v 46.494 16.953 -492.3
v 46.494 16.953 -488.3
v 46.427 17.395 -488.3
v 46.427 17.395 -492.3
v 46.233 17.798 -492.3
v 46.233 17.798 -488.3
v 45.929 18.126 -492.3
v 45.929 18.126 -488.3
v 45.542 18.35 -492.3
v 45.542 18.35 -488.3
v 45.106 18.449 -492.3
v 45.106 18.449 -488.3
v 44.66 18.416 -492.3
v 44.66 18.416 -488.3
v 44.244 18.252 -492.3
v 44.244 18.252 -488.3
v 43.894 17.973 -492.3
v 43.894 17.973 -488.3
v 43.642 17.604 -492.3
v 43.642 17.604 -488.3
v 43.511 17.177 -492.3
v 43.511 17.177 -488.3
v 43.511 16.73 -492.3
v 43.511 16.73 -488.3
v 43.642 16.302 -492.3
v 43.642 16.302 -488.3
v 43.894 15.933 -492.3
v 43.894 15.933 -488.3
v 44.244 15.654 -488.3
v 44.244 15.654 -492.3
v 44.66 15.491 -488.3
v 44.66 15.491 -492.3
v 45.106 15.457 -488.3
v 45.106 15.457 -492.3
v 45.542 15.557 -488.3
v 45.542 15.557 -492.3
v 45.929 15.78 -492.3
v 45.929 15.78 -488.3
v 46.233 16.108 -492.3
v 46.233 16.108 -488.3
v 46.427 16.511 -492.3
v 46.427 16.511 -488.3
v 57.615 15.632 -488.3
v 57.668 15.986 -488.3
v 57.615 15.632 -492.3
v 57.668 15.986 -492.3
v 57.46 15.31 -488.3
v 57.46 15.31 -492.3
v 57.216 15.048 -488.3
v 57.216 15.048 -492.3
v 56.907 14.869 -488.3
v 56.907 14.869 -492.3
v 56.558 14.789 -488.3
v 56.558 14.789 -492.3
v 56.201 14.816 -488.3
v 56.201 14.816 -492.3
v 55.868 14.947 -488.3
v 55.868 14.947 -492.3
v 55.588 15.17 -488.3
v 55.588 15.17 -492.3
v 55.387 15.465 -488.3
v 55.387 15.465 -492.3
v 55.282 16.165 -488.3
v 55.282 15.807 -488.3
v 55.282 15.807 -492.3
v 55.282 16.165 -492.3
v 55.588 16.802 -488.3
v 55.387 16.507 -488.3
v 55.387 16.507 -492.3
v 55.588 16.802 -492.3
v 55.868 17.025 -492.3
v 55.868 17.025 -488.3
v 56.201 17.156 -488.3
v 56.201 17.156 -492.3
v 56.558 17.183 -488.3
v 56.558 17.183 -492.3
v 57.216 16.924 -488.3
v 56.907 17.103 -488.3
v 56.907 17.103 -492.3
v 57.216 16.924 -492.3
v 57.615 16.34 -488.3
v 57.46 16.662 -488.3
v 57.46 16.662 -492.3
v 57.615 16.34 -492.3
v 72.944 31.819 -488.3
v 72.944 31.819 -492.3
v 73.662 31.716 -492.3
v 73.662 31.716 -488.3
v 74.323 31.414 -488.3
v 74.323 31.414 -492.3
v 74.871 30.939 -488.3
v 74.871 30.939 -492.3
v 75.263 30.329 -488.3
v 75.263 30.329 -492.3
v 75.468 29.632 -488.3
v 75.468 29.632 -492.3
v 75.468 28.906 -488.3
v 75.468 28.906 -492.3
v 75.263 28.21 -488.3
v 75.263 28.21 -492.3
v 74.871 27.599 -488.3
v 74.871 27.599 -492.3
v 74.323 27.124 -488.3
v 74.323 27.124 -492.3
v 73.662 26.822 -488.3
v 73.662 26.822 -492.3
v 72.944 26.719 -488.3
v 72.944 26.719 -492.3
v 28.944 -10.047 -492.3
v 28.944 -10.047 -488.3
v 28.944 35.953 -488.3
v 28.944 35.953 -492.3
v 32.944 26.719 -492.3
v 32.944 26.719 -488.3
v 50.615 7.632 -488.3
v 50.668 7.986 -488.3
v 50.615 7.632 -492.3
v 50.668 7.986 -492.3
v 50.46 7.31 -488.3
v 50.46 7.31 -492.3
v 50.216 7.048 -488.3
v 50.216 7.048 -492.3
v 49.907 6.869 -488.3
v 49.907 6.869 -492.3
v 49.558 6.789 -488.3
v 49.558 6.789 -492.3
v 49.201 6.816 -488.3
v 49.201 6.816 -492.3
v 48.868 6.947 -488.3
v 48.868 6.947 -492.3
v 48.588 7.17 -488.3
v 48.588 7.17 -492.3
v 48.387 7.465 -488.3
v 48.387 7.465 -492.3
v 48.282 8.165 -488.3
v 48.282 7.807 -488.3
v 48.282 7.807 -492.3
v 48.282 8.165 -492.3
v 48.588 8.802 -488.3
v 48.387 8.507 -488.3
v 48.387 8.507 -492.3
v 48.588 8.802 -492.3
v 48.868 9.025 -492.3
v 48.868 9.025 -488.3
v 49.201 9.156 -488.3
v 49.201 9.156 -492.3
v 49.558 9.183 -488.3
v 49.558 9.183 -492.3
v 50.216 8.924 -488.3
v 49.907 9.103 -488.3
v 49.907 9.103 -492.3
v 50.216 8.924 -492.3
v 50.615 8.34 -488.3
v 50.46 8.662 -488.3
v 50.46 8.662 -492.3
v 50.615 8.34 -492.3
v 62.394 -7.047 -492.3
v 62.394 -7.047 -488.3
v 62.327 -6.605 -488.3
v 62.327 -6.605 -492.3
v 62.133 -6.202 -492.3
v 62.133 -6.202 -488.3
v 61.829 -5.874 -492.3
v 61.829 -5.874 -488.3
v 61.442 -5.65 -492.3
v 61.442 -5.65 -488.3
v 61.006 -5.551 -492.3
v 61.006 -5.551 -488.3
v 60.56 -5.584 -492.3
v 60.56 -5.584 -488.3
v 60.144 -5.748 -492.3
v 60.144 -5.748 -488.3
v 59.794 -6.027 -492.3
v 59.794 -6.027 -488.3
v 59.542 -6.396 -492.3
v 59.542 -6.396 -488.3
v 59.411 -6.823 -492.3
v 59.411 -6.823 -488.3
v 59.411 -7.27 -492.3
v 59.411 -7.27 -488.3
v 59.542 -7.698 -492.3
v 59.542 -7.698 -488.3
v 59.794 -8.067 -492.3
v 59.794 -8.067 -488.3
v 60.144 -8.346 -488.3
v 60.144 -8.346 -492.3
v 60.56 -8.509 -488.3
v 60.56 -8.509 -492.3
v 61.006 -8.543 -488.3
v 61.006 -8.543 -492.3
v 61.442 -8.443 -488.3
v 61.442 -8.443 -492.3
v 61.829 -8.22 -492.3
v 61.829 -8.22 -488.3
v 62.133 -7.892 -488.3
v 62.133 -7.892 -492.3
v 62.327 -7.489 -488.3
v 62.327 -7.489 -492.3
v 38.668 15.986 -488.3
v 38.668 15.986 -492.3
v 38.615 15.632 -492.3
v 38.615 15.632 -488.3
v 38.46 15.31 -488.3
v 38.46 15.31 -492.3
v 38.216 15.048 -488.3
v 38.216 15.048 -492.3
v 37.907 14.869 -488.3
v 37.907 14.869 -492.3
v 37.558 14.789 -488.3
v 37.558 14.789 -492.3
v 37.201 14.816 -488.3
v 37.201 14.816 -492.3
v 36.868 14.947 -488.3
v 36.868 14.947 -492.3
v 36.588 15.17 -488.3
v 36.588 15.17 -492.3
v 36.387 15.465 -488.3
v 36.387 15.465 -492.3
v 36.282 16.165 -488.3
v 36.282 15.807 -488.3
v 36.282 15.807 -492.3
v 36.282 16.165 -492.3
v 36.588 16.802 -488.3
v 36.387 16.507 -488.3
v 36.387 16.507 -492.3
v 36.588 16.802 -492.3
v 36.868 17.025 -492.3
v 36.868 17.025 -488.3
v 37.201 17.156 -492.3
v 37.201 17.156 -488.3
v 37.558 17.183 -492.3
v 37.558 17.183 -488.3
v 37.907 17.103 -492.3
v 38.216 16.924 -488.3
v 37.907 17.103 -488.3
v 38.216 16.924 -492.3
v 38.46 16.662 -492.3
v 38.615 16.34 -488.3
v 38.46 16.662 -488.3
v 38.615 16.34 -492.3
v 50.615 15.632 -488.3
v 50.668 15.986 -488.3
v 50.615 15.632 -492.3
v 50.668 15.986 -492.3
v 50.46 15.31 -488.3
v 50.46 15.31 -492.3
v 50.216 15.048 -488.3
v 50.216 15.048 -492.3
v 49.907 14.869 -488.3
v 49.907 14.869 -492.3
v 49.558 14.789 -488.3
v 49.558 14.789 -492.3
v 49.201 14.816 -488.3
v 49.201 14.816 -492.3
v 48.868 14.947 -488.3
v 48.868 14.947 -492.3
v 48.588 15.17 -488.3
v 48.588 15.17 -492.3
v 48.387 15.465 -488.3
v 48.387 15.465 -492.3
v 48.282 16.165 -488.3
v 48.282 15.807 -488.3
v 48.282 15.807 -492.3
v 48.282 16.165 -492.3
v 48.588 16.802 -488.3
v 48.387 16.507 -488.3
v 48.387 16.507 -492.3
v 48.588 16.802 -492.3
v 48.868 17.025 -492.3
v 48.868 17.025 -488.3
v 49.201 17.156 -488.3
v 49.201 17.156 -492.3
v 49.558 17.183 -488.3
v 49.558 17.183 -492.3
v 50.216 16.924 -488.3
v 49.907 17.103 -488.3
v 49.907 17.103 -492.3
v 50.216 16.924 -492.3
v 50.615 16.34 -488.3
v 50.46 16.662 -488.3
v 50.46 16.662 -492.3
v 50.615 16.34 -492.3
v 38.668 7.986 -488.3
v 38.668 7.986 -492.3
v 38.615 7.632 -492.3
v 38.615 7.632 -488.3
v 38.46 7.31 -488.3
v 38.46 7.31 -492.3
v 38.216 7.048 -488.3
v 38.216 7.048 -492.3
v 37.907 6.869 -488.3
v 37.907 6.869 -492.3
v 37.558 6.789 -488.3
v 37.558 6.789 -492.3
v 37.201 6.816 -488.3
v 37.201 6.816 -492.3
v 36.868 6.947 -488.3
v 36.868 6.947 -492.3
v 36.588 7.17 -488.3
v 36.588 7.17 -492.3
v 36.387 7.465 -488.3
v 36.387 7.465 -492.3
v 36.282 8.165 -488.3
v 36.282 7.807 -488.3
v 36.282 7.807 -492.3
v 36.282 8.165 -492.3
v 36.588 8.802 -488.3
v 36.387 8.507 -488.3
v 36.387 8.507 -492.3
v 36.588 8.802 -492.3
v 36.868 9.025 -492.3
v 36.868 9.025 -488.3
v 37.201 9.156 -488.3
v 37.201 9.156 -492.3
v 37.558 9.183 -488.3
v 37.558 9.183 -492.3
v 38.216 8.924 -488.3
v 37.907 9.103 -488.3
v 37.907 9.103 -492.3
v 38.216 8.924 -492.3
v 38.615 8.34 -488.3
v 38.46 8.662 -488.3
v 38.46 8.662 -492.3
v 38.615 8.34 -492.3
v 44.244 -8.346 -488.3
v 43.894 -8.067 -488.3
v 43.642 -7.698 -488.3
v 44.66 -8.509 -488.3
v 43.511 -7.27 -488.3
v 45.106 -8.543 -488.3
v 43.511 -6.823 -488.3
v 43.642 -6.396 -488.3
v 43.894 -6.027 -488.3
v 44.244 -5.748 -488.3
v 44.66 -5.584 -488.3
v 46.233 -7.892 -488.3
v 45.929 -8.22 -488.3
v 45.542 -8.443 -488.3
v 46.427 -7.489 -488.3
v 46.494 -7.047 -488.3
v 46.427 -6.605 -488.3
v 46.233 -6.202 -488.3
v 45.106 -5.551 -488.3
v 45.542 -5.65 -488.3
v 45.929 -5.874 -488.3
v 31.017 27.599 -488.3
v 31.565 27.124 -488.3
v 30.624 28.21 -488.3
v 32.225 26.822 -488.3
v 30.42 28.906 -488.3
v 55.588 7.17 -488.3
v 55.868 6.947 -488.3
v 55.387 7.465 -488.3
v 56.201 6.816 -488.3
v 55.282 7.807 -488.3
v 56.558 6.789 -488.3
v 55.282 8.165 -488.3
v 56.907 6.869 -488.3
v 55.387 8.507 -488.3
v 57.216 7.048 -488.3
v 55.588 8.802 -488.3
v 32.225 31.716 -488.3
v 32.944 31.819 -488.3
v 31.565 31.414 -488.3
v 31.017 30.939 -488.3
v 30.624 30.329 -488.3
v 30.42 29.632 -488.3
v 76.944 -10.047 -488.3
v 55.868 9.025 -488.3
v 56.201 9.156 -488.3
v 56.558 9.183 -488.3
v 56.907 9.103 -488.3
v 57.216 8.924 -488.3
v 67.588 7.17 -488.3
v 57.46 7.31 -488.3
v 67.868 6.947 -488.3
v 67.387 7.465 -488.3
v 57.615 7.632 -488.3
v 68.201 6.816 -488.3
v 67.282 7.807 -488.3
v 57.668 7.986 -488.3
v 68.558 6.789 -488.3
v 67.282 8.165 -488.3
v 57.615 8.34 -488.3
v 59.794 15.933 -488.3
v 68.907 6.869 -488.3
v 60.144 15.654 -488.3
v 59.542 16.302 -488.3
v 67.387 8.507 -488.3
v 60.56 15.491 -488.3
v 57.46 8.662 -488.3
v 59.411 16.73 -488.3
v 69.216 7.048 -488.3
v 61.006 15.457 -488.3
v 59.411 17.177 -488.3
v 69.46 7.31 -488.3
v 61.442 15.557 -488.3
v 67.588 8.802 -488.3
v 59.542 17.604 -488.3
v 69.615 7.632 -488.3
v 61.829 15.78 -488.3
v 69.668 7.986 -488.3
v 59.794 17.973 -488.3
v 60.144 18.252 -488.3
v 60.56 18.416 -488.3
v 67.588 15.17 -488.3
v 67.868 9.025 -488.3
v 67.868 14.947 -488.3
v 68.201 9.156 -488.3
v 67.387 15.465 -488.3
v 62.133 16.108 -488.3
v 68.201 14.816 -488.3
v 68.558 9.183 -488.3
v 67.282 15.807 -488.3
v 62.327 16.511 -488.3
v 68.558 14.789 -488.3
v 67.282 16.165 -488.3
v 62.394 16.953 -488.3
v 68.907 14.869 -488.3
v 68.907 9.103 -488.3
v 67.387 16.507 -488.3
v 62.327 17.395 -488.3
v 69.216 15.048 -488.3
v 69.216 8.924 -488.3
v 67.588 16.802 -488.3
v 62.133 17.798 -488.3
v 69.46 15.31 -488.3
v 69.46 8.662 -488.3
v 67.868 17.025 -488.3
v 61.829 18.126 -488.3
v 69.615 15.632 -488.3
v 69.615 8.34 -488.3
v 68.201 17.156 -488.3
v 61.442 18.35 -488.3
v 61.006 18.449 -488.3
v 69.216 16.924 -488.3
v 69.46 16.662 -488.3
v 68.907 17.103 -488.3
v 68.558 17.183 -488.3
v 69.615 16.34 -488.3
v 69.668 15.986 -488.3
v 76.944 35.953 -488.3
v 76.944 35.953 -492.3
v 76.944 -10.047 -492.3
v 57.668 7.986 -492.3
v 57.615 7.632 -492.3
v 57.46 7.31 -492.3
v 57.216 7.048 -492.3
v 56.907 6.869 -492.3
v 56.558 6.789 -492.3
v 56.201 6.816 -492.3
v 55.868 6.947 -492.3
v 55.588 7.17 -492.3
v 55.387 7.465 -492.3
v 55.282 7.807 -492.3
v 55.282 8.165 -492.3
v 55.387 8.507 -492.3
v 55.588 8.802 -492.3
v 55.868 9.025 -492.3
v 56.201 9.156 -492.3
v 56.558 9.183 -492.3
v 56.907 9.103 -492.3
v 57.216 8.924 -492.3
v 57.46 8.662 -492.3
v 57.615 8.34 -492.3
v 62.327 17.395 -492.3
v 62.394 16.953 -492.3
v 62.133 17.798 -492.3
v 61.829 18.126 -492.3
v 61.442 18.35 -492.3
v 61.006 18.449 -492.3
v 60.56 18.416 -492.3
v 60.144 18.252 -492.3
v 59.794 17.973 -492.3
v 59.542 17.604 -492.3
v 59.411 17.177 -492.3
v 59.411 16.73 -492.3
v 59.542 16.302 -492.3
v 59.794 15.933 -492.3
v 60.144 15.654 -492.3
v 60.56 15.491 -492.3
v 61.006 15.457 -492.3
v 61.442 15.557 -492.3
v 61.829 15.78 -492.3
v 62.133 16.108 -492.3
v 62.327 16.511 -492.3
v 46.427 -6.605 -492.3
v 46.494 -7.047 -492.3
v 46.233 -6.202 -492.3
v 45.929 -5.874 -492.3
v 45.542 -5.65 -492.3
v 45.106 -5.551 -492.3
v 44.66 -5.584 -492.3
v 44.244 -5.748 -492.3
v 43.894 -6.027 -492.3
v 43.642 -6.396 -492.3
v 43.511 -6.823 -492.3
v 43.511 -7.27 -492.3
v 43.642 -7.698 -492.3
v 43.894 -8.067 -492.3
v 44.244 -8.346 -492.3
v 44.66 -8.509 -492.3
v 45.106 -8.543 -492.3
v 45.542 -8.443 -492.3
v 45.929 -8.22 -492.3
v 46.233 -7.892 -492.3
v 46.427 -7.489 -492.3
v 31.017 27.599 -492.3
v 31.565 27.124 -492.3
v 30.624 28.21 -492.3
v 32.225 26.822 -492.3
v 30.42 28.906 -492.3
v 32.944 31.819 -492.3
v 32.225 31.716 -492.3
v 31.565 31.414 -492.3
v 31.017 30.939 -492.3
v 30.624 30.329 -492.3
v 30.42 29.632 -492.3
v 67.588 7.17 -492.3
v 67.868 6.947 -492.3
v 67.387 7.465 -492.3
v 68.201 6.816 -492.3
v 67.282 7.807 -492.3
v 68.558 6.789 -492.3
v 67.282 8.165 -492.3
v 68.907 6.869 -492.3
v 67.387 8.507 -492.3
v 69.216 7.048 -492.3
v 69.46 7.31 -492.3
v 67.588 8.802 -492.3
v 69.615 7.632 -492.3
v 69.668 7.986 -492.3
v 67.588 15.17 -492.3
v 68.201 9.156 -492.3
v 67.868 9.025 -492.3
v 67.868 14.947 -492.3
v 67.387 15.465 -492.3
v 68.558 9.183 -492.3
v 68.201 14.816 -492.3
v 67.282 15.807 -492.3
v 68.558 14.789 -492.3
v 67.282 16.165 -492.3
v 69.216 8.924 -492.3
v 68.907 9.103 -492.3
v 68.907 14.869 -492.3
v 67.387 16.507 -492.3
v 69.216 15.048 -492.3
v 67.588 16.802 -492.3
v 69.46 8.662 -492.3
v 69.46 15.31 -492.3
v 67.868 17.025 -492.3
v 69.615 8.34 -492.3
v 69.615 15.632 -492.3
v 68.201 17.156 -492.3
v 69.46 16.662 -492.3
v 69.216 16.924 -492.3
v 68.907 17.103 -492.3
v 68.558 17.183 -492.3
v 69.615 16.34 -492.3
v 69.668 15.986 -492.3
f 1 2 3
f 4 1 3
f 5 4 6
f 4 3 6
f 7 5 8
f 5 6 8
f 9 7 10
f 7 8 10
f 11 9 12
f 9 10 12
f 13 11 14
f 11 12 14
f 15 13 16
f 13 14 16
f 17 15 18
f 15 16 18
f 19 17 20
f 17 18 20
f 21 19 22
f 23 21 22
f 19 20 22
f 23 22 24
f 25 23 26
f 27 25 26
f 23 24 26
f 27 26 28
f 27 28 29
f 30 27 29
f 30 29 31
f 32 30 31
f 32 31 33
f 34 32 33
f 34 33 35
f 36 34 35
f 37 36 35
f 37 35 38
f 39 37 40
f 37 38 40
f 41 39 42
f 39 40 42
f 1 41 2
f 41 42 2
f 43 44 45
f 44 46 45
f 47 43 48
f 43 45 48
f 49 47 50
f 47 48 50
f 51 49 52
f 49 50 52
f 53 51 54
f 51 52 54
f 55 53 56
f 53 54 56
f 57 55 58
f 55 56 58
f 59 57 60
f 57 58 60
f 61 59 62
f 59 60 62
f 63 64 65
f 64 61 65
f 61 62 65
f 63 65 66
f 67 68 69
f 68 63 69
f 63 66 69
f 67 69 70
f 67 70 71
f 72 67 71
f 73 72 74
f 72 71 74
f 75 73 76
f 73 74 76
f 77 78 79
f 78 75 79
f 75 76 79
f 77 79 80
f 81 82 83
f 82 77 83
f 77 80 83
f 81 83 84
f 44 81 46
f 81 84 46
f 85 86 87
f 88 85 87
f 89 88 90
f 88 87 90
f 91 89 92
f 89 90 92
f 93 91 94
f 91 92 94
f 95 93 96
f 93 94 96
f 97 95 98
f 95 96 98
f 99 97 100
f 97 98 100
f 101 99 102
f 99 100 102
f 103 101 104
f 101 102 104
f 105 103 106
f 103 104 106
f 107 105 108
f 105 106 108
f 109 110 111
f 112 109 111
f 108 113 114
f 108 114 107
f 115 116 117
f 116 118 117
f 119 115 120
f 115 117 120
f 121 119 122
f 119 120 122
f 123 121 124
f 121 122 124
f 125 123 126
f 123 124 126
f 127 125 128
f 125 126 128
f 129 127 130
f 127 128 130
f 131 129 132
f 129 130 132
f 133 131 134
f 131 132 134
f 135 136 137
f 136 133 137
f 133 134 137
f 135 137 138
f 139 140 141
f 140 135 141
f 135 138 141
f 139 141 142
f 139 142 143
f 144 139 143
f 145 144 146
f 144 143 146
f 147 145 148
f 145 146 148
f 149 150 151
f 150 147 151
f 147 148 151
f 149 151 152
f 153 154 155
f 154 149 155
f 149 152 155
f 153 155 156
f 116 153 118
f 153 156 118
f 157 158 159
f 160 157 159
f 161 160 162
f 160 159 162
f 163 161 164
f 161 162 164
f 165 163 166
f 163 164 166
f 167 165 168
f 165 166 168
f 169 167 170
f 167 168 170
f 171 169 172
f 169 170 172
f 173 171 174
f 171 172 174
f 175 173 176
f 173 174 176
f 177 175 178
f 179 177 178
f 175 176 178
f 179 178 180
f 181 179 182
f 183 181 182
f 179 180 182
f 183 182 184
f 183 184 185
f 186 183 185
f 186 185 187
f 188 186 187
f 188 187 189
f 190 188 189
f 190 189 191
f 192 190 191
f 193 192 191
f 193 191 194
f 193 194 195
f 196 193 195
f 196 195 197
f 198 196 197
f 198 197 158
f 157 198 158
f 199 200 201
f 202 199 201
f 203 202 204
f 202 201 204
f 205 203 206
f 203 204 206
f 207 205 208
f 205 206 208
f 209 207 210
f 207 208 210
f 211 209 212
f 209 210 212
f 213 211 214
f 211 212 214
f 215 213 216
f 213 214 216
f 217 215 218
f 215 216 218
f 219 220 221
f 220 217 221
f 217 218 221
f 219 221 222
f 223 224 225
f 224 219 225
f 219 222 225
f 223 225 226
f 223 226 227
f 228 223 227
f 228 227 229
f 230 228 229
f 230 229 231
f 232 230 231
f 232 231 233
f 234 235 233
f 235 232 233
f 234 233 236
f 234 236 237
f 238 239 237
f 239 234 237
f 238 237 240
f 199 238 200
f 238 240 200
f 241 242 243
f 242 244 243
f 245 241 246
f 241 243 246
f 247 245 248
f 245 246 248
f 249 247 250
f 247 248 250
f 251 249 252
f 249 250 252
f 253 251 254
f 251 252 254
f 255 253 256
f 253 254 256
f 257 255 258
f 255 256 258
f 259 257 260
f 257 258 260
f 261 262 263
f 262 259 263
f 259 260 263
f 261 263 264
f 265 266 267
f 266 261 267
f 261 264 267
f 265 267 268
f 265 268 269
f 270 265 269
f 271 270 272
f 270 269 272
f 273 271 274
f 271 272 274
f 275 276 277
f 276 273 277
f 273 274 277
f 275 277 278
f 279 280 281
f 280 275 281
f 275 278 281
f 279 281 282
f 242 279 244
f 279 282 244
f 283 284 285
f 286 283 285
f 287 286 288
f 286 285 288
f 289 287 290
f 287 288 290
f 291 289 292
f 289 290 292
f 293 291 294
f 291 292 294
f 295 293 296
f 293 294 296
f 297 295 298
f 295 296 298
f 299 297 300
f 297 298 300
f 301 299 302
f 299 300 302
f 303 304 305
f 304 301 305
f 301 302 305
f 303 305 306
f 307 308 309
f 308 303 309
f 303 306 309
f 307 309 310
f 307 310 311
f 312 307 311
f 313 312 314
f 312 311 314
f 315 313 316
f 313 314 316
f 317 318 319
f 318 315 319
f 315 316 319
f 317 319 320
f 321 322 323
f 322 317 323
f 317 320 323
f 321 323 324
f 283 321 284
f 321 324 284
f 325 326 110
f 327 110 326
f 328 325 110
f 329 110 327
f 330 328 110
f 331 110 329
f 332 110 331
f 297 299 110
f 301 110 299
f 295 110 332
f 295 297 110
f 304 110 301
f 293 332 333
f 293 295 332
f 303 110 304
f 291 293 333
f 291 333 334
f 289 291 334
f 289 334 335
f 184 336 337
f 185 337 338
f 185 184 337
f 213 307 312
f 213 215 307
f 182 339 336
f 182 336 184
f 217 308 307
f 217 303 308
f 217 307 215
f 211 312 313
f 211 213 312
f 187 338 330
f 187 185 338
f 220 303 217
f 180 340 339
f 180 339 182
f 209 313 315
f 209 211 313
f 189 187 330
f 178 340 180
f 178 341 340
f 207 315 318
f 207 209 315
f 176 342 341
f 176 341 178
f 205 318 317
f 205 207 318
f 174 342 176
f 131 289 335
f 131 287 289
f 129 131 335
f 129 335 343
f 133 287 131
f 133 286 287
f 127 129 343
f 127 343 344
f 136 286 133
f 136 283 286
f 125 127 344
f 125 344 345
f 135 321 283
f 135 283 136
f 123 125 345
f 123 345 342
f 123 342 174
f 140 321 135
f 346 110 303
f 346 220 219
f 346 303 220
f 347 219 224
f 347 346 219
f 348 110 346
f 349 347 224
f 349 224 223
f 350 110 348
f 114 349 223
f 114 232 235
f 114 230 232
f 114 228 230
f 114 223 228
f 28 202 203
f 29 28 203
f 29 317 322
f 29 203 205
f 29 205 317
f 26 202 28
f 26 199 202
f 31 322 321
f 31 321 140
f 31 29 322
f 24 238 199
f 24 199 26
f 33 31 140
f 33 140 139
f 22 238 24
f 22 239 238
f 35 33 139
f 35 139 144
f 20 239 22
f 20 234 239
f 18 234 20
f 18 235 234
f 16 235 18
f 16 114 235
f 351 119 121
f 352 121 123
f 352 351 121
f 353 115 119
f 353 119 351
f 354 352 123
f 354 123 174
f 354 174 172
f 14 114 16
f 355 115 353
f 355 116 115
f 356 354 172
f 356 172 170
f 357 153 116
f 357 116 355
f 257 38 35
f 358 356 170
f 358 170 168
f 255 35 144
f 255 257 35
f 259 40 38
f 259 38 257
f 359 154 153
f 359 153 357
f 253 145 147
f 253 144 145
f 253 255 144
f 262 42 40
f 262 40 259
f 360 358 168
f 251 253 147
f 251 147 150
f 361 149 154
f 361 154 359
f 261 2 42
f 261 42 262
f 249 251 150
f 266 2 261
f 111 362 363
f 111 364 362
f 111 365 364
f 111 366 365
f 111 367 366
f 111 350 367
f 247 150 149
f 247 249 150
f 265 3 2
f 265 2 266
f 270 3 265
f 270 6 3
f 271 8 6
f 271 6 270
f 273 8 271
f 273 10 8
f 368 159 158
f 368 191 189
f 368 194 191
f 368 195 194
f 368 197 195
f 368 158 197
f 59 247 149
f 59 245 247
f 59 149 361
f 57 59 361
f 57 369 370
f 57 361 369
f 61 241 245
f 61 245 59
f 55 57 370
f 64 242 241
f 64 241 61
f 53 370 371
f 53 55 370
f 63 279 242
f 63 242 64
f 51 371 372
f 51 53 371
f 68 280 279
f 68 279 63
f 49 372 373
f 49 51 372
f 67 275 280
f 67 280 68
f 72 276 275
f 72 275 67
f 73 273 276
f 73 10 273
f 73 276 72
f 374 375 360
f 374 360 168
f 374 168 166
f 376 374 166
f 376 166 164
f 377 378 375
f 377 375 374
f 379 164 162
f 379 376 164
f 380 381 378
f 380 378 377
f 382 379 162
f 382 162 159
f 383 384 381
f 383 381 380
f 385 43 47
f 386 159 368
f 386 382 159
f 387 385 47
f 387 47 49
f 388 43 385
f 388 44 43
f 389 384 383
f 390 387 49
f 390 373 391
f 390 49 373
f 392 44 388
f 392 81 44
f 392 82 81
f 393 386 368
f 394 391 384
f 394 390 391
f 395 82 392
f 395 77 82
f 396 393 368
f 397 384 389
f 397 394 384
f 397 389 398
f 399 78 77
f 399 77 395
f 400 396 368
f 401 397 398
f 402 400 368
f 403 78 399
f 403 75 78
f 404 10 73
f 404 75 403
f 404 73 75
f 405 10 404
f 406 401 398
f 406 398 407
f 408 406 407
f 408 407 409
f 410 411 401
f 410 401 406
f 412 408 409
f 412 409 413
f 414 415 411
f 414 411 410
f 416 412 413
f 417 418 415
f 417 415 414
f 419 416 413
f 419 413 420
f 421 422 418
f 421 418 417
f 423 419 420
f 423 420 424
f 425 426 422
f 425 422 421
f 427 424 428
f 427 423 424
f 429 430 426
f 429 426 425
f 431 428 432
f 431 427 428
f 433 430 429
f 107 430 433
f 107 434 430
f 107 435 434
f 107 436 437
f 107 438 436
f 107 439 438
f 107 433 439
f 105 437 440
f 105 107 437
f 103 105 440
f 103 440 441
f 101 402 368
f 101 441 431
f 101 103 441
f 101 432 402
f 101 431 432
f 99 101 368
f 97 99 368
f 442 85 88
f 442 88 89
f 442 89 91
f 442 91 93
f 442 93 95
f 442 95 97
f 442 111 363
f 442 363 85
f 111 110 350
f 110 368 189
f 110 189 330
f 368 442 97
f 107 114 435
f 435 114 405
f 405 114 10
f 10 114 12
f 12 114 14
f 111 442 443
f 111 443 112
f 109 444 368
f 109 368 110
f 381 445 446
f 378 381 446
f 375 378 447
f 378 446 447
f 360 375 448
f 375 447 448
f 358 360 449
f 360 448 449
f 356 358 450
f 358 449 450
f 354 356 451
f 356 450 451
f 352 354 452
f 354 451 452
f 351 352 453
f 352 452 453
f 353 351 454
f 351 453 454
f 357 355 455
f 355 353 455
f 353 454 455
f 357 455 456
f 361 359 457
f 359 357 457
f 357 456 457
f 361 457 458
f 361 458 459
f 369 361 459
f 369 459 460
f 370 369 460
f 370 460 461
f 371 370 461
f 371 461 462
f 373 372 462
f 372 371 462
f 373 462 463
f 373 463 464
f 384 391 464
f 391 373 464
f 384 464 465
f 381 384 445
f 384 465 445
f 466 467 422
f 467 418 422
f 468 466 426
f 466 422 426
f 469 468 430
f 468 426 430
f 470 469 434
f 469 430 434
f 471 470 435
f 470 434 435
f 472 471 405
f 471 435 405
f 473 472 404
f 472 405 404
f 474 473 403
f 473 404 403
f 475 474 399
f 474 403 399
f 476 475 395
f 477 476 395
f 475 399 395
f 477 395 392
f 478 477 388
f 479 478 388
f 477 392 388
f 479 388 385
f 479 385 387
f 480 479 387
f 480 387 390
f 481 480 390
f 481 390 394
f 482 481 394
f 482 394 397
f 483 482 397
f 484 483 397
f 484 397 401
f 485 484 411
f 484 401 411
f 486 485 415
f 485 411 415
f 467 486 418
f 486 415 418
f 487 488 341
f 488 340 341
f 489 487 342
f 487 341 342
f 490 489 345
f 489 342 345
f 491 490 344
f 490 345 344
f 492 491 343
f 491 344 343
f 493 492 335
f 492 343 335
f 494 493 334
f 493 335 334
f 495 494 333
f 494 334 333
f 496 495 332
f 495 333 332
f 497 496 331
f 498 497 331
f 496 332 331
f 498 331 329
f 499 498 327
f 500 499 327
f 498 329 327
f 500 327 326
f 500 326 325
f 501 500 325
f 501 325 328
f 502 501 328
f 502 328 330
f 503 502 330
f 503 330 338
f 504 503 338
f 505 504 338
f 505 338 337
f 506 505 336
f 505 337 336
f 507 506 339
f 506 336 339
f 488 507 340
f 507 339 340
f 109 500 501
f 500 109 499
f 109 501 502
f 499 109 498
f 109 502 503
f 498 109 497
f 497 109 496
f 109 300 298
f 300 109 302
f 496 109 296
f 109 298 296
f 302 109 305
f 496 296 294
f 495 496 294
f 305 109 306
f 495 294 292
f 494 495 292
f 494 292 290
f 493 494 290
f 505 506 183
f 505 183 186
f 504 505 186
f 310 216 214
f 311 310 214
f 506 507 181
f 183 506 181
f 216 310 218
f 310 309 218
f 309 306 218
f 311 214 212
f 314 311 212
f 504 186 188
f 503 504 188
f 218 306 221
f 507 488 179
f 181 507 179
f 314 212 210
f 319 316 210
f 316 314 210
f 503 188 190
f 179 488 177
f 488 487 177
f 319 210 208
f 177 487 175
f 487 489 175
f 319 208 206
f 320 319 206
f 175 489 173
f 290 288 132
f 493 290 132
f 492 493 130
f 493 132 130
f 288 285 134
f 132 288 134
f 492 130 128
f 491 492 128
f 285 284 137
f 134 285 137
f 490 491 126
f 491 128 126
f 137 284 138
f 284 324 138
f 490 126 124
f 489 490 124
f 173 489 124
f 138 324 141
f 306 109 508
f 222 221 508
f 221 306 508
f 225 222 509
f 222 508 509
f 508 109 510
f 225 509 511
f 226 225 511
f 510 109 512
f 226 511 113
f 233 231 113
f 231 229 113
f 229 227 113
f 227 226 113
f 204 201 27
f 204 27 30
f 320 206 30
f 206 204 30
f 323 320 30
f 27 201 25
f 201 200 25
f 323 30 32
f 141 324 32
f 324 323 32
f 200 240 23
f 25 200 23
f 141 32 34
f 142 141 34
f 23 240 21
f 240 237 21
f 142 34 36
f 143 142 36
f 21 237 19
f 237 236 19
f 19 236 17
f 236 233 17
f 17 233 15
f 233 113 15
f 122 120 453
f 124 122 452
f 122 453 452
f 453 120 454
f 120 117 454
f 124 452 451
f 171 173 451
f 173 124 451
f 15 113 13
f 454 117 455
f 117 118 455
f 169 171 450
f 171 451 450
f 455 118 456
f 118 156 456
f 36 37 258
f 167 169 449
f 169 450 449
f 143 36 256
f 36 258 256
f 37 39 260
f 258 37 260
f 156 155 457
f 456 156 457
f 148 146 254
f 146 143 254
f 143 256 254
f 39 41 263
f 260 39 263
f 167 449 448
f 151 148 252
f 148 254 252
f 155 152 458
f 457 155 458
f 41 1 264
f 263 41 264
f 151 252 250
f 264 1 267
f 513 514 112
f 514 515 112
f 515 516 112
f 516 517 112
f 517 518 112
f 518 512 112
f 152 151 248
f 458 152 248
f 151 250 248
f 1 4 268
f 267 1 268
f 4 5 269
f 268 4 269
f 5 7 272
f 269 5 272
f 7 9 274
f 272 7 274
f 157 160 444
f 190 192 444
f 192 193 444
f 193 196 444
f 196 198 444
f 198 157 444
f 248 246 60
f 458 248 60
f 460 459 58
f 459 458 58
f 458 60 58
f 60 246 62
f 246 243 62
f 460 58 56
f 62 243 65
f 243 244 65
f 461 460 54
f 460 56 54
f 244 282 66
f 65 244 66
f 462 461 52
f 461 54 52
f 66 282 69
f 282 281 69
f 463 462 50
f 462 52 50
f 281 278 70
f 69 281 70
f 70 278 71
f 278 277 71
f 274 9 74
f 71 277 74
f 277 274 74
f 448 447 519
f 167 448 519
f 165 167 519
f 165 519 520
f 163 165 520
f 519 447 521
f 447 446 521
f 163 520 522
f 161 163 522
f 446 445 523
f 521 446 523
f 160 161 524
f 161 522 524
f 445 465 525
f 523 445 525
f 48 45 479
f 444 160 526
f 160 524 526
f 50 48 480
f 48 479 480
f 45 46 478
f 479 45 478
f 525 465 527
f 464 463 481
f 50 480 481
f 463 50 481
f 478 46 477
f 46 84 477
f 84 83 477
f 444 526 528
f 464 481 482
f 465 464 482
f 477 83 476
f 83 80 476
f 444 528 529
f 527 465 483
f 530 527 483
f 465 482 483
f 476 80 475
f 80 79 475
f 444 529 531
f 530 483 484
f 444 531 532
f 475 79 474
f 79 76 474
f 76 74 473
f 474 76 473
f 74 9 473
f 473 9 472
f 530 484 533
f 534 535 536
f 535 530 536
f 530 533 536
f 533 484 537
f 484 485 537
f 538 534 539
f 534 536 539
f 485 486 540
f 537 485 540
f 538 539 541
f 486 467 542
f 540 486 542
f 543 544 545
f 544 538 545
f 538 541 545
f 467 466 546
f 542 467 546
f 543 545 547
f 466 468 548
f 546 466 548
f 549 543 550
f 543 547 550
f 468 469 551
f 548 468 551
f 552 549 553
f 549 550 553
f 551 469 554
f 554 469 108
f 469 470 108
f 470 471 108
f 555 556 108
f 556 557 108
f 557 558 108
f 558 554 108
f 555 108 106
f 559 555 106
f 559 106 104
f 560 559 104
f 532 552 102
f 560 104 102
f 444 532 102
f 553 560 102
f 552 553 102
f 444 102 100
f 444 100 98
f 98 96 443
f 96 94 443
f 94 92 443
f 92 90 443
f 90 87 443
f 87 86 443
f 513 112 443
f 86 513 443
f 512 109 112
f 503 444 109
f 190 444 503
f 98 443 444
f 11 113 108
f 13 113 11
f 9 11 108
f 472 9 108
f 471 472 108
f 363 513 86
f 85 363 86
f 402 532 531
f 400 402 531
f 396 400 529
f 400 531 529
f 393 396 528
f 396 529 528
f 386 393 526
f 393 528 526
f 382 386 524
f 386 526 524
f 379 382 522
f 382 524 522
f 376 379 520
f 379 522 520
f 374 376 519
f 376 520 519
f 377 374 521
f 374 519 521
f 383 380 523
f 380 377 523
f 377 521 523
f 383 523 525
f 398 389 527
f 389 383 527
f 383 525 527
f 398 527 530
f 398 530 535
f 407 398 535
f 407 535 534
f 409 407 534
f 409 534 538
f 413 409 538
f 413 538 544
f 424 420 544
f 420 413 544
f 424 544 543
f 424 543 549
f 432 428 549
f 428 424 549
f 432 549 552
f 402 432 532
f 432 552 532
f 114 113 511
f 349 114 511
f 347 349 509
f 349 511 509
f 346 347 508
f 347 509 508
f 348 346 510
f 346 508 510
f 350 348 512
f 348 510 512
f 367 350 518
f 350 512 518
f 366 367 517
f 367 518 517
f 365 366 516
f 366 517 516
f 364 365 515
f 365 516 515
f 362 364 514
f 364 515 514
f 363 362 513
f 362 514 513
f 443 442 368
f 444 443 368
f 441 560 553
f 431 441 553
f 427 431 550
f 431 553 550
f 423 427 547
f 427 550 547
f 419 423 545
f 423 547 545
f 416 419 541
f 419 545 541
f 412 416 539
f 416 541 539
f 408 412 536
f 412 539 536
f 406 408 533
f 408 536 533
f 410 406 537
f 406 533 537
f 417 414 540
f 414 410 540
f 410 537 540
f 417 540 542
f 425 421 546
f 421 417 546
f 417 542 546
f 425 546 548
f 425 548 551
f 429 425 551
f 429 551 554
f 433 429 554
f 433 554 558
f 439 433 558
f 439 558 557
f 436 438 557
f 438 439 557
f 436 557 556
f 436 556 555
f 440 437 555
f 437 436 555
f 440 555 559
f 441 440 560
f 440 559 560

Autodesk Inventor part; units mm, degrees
ref_plane "YZ Plane" through (0, 0, 0) normal (1, 0, 0) x (0, 1, 0)
ref_plane "XZ Plane" through (0, 0, 0) normal (0, 1, 0) x (-1, 0, 0)
ref_plane "XY Plane" through (0, 0, 0) normal (0, 0, 1) x (1, 0, 0)
ref_plane "РабПлоскость1" through (30.6718, 18.7359, -492.3) normal (0, 0, 1) x (1, 0, 0)
sketch "Эскиз1" plane through (30.6718, 18.7359, -492.3) normal (0, 0, 1) x (1, 0, 0)
  line L0 (9.0963, 0) -> (4.4963, 0) projected
  line L1 (4.4963, 0) -> (4.4963, -13.5) projected
  line L2 (9.0963, -13.5) -> (4.4963, -13.5) projected
  line L3 (9.0963, -13.5) -> (9.0963, 0) projected
  circle A0 centre (6.7963, -2.75) radius 1.2 projected
  circle A1 centre (6.7963, -10.75) radius 1.2 projected
  line L4 (21.0963, 0) -> (16.4963, 0) projected
  line L5 (16.4963, 0) -> (16.4963, -13.5) projected
  line L6 (21.0963, -13.5) -> (16.4963, -13.5) projected
  line L7 (21.0963, -13.5) -> (21.0963, 0) projected
  circle A2 centre (18.7963, -2.75) radius 1.2 projected
  circle A3 centre (18.7963, -10.75) radius 1.2 projected
  line L8 (28.0963, 0) -> (23.4963, 0) projected
  line L9 (23.4963, 0) -> (23.4963, -13.5) projected
  line L10 (28.0963, -13.5) -> (23.4963, -13.5) projected
  line L11 (28.0963, -13.5) -> (28.0963, 0) projected
  circle A4 centre (25.7963, -2.75) radius 1.2 projected
  circle A5 centre (25.7963, -10.75) radius 1.2 projected
  line L12 (40.0963, 0) -> (35.4963, 0) projected
  line L13 (35.4963, 0) -> (35.4963, -13.5) projected
  line L14 (40.0963, -13.5) -> (35.4963, -13.5) projected
  line L15 (40.0963, -13.5) -> (40.0963, 0) projected
  circle A6 centre (37.7963, -2.75) radius 1.2 projected
  circle A7 centre (37.7963, -10.75) radius 1.2 projected
  circle A8 centre (36.2999, 10.4999) radius 2.5 projected
  circle A9 centre (36.2999, 10.4999) radius 1 projected
  line L16 (-2.7279, 21.2173) -> (47.2721, 21.2173)
  line L17 (47.2721, 21.2173) -> (47.2721, -28.7827)
  line L18 (47.2721, -28.7827) -> (-2.7279, -28.7827)
  line L19 (-2.7279, -28.7827) -> (-2.7279, 21.2173)
  line L20 (22.2721, -16.5) -> (22.2721, -5.5248)
  line L21 (13.8, -23.7827) -> (31.824, -23.7827)
  line L22 (2.2721, 13.0833) -> (42.2721, 13.0833)
  line L23 (2.2721, 7.9833) -> (42.2721, 7.9833)
  circle A10 centre (2.2721, 10.5333) radius 2.55
  circle A11 centre (42.2721, 10.5333) radius 2.55
  point P0 (-30.6718, -18.7359)
  point P1 (-2.7279, -3.7827)
  point P2 (42.2721, 13.0833)
  dimension "d0" = 50
  dimension "d1" = 50
  dimension "d2" = 25
  dimension "d3" = 5
  dimension "d10" = 40
  dimension "d11" = 5
  dimension "d13" = 5
  dimension "d14" = 5.1
extrude "Выдавливание1" add sketch "Эскиз1" along normal blind 4 contours L3 L2 L1 L0 | L7 L6 L5 L4 | L11 L10 L9 L8 | L15 L14 L13 L12 | L16 L17 L18 L19
sketch "Эскиз2" plane through (30.6718, 18.7359, -488.3) normal (0, 0, 1) x (1, 0, 0)
  circle A0 centre (30.2221, -1.7827) radius 1.5 projected
  circle A1 centre (14.3221, -1.7827) radius 1.5 projected
  circle A2 centre (30.2221, -25.7827) radius 1.5 projected
  circle A3 centre (14.3221, -25.7827) radius 1.5 projected
  point P0 (-30.6718, -18.7359)
extrude "Выдавливание2" cut sketch "Эскиз2" against normal blind 10
sketch "Эскиз3" plane through (30.6718, 18.7359, -488.3) normal (0, 0, 1) x (1, 0, 0)
  line L0 (47.2721, 21.2173) -> (-2.7279, 21.2173) projected
  line L1 (47.2721, -28.7827) -> (47.2721, 21.2173) projected
  line L2 (-2.7279, 21.2173) -> (47.2721, 21.2173)
  line L3 (47.2721, 21.2173) -> (47.2721, 17.2173)
  line L4 (47.2721, 17.2173) -> (-2.7279, 17.2173)
  line L5 (-2.7279, 17.2173) -> (-2.7279, 21.2173)
  point P0 (-30.6718, -18.7359)
  dimension "d15" = 4
extrude "Выдавливание3" cut sketch "Эскиз3" against normal blind 10
sketch "Эскиз4" plane through (30.6718, 18.7359, -488.3) normal (0, 0, 1) x (1, 0, 0)
  line L0 (-2.7279, 17.2173) -> (-2.7279, -28.7827) projected
  line L1 (47.2721, 17.2173) -> (-2.7279, 17.2173) projected
  line L2 (-2.7279, -28.7827) -> (-1.7279, -28.7827)
  line L3 (-1.7279, -28.7827) -> (-1.7279, 17.2173)
  line L4 (-1.7279, 17.2173) -> (-2.7279, 17.2173)
  line L5 (-2.7279, 17.2173) -> (-2.7279, -28.7827)
  line L6 (47.2721, -28.7827) -> (47.2721, 17.2173) projected
  line L7 (-2.7279, -28.7827) -> (47.2721, -28.7827) projected
  line L8 (47.2721, 17.2173) -> (46.2721, 17.2173)
  line L9 (46.2721, 17.2173) -> (46.2721, -28.7827)
  line L10 (46.2721, -28.7827) -> (47.2721, -28.7827)
  line L11 (47.2721, -28.7827) -> (47.2721, 17.2173)
  point P0 (-30.6718, -18.7359)
  dimension "d18" = 1
  dimension "d19" = 1
extrude "Выдавливание4" cut sketch "Эскиз4" against normal blind 10 contours L1 L3 L2 L0 | L1 L6 L7 L9
properties part number "деталь на которой рельсы"
